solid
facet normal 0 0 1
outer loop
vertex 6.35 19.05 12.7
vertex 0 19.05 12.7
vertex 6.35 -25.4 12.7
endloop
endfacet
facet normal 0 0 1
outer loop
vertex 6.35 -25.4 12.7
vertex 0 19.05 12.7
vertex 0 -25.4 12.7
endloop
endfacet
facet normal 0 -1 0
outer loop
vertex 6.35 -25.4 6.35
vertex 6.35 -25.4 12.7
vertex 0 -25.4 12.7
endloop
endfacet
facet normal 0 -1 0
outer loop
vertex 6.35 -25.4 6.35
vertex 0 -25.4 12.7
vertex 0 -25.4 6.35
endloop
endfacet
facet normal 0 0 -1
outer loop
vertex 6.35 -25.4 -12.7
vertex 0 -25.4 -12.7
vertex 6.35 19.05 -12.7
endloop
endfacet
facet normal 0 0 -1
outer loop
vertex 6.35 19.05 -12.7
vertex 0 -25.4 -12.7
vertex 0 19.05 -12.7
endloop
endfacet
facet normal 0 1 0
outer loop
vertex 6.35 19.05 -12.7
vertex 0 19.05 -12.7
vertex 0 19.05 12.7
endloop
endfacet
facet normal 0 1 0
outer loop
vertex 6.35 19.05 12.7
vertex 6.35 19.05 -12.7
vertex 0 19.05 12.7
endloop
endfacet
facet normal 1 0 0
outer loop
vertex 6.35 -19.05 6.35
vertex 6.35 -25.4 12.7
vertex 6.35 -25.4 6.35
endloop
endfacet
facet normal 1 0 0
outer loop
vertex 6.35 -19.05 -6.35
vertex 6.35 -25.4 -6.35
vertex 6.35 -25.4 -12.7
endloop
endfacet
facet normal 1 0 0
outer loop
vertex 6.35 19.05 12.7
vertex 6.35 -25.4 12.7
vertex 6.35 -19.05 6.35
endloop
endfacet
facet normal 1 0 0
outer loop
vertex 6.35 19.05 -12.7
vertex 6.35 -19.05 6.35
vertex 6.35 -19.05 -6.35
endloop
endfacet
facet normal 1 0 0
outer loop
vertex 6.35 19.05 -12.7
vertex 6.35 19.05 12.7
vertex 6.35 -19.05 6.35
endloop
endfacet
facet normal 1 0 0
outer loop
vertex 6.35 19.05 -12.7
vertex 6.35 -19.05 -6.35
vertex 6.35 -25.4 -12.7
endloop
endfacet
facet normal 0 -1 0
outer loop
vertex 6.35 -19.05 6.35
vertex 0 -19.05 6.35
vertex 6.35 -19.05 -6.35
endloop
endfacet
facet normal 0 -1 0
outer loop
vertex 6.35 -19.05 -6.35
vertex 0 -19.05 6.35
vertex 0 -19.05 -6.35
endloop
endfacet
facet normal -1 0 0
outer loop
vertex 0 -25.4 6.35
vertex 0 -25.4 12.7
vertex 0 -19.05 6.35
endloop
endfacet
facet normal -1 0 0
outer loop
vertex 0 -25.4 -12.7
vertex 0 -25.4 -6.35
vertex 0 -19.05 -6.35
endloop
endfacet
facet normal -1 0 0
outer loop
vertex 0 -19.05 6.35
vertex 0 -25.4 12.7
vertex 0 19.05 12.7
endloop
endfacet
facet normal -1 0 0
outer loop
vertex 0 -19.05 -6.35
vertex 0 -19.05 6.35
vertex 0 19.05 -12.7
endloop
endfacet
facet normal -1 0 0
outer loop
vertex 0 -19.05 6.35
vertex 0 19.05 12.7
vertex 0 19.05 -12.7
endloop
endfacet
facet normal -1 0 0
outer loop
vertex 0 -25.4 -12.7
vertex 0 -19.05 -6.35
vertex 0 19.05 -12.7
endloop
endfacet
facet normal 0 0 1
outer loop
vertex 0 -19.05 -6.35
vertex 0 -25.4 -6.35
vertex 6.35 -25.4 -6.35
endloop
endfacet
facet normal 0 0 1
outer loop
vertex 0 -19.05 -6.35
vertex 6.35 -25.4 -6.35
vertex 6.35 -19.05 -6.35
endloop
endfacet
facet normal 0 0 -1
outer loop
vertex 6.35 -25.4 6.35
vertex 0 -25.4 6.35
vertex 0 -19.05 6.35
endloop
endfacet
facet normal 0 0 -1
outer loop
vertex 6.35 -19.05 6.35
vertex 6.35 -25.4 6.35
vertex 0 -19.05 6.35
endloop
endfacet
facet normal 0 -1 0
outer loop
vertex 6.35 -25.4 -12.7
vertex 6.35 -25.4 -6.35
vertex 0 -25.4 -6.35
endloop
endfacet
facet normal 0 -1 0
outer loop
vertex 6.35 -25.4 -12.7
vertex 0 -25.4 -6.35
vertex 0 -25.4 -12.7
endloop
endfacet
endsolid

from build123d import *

# Parameters (mm, degrees)
SKETCH1_W           = 6.35
SKETCH1_H           = 6.35
BOSS_EXTRUDE1_DEPTH = 6.35


with BuildPart() as part:
    # Sketch1 → Boss-Extrude1 (new body)
    with BuildSketch(Plane(origin=(0, 0, 0), x_dir=(0, 0, -1), z_dir=(1, 0, 0))):
        Polygon((-12.7, -12.7), (-12.7, -19.05), (-6.35, -19.05), (6.35, -19.05), (12.7, -19.05), (12.7, 19.05), (-12.7, 19.05), align=None)
        with Locations((-9.525, -22.225)):
            Rectangle(SKETCH1_W, SKETCH1_H)
        with Locations((9.525, -22.225)):
            Rectangle(SKETCH1_W, SKETCH1_H)
    extrude(amount=BOSS_EXTRUDE1_DEPTH)


solid = part.part
